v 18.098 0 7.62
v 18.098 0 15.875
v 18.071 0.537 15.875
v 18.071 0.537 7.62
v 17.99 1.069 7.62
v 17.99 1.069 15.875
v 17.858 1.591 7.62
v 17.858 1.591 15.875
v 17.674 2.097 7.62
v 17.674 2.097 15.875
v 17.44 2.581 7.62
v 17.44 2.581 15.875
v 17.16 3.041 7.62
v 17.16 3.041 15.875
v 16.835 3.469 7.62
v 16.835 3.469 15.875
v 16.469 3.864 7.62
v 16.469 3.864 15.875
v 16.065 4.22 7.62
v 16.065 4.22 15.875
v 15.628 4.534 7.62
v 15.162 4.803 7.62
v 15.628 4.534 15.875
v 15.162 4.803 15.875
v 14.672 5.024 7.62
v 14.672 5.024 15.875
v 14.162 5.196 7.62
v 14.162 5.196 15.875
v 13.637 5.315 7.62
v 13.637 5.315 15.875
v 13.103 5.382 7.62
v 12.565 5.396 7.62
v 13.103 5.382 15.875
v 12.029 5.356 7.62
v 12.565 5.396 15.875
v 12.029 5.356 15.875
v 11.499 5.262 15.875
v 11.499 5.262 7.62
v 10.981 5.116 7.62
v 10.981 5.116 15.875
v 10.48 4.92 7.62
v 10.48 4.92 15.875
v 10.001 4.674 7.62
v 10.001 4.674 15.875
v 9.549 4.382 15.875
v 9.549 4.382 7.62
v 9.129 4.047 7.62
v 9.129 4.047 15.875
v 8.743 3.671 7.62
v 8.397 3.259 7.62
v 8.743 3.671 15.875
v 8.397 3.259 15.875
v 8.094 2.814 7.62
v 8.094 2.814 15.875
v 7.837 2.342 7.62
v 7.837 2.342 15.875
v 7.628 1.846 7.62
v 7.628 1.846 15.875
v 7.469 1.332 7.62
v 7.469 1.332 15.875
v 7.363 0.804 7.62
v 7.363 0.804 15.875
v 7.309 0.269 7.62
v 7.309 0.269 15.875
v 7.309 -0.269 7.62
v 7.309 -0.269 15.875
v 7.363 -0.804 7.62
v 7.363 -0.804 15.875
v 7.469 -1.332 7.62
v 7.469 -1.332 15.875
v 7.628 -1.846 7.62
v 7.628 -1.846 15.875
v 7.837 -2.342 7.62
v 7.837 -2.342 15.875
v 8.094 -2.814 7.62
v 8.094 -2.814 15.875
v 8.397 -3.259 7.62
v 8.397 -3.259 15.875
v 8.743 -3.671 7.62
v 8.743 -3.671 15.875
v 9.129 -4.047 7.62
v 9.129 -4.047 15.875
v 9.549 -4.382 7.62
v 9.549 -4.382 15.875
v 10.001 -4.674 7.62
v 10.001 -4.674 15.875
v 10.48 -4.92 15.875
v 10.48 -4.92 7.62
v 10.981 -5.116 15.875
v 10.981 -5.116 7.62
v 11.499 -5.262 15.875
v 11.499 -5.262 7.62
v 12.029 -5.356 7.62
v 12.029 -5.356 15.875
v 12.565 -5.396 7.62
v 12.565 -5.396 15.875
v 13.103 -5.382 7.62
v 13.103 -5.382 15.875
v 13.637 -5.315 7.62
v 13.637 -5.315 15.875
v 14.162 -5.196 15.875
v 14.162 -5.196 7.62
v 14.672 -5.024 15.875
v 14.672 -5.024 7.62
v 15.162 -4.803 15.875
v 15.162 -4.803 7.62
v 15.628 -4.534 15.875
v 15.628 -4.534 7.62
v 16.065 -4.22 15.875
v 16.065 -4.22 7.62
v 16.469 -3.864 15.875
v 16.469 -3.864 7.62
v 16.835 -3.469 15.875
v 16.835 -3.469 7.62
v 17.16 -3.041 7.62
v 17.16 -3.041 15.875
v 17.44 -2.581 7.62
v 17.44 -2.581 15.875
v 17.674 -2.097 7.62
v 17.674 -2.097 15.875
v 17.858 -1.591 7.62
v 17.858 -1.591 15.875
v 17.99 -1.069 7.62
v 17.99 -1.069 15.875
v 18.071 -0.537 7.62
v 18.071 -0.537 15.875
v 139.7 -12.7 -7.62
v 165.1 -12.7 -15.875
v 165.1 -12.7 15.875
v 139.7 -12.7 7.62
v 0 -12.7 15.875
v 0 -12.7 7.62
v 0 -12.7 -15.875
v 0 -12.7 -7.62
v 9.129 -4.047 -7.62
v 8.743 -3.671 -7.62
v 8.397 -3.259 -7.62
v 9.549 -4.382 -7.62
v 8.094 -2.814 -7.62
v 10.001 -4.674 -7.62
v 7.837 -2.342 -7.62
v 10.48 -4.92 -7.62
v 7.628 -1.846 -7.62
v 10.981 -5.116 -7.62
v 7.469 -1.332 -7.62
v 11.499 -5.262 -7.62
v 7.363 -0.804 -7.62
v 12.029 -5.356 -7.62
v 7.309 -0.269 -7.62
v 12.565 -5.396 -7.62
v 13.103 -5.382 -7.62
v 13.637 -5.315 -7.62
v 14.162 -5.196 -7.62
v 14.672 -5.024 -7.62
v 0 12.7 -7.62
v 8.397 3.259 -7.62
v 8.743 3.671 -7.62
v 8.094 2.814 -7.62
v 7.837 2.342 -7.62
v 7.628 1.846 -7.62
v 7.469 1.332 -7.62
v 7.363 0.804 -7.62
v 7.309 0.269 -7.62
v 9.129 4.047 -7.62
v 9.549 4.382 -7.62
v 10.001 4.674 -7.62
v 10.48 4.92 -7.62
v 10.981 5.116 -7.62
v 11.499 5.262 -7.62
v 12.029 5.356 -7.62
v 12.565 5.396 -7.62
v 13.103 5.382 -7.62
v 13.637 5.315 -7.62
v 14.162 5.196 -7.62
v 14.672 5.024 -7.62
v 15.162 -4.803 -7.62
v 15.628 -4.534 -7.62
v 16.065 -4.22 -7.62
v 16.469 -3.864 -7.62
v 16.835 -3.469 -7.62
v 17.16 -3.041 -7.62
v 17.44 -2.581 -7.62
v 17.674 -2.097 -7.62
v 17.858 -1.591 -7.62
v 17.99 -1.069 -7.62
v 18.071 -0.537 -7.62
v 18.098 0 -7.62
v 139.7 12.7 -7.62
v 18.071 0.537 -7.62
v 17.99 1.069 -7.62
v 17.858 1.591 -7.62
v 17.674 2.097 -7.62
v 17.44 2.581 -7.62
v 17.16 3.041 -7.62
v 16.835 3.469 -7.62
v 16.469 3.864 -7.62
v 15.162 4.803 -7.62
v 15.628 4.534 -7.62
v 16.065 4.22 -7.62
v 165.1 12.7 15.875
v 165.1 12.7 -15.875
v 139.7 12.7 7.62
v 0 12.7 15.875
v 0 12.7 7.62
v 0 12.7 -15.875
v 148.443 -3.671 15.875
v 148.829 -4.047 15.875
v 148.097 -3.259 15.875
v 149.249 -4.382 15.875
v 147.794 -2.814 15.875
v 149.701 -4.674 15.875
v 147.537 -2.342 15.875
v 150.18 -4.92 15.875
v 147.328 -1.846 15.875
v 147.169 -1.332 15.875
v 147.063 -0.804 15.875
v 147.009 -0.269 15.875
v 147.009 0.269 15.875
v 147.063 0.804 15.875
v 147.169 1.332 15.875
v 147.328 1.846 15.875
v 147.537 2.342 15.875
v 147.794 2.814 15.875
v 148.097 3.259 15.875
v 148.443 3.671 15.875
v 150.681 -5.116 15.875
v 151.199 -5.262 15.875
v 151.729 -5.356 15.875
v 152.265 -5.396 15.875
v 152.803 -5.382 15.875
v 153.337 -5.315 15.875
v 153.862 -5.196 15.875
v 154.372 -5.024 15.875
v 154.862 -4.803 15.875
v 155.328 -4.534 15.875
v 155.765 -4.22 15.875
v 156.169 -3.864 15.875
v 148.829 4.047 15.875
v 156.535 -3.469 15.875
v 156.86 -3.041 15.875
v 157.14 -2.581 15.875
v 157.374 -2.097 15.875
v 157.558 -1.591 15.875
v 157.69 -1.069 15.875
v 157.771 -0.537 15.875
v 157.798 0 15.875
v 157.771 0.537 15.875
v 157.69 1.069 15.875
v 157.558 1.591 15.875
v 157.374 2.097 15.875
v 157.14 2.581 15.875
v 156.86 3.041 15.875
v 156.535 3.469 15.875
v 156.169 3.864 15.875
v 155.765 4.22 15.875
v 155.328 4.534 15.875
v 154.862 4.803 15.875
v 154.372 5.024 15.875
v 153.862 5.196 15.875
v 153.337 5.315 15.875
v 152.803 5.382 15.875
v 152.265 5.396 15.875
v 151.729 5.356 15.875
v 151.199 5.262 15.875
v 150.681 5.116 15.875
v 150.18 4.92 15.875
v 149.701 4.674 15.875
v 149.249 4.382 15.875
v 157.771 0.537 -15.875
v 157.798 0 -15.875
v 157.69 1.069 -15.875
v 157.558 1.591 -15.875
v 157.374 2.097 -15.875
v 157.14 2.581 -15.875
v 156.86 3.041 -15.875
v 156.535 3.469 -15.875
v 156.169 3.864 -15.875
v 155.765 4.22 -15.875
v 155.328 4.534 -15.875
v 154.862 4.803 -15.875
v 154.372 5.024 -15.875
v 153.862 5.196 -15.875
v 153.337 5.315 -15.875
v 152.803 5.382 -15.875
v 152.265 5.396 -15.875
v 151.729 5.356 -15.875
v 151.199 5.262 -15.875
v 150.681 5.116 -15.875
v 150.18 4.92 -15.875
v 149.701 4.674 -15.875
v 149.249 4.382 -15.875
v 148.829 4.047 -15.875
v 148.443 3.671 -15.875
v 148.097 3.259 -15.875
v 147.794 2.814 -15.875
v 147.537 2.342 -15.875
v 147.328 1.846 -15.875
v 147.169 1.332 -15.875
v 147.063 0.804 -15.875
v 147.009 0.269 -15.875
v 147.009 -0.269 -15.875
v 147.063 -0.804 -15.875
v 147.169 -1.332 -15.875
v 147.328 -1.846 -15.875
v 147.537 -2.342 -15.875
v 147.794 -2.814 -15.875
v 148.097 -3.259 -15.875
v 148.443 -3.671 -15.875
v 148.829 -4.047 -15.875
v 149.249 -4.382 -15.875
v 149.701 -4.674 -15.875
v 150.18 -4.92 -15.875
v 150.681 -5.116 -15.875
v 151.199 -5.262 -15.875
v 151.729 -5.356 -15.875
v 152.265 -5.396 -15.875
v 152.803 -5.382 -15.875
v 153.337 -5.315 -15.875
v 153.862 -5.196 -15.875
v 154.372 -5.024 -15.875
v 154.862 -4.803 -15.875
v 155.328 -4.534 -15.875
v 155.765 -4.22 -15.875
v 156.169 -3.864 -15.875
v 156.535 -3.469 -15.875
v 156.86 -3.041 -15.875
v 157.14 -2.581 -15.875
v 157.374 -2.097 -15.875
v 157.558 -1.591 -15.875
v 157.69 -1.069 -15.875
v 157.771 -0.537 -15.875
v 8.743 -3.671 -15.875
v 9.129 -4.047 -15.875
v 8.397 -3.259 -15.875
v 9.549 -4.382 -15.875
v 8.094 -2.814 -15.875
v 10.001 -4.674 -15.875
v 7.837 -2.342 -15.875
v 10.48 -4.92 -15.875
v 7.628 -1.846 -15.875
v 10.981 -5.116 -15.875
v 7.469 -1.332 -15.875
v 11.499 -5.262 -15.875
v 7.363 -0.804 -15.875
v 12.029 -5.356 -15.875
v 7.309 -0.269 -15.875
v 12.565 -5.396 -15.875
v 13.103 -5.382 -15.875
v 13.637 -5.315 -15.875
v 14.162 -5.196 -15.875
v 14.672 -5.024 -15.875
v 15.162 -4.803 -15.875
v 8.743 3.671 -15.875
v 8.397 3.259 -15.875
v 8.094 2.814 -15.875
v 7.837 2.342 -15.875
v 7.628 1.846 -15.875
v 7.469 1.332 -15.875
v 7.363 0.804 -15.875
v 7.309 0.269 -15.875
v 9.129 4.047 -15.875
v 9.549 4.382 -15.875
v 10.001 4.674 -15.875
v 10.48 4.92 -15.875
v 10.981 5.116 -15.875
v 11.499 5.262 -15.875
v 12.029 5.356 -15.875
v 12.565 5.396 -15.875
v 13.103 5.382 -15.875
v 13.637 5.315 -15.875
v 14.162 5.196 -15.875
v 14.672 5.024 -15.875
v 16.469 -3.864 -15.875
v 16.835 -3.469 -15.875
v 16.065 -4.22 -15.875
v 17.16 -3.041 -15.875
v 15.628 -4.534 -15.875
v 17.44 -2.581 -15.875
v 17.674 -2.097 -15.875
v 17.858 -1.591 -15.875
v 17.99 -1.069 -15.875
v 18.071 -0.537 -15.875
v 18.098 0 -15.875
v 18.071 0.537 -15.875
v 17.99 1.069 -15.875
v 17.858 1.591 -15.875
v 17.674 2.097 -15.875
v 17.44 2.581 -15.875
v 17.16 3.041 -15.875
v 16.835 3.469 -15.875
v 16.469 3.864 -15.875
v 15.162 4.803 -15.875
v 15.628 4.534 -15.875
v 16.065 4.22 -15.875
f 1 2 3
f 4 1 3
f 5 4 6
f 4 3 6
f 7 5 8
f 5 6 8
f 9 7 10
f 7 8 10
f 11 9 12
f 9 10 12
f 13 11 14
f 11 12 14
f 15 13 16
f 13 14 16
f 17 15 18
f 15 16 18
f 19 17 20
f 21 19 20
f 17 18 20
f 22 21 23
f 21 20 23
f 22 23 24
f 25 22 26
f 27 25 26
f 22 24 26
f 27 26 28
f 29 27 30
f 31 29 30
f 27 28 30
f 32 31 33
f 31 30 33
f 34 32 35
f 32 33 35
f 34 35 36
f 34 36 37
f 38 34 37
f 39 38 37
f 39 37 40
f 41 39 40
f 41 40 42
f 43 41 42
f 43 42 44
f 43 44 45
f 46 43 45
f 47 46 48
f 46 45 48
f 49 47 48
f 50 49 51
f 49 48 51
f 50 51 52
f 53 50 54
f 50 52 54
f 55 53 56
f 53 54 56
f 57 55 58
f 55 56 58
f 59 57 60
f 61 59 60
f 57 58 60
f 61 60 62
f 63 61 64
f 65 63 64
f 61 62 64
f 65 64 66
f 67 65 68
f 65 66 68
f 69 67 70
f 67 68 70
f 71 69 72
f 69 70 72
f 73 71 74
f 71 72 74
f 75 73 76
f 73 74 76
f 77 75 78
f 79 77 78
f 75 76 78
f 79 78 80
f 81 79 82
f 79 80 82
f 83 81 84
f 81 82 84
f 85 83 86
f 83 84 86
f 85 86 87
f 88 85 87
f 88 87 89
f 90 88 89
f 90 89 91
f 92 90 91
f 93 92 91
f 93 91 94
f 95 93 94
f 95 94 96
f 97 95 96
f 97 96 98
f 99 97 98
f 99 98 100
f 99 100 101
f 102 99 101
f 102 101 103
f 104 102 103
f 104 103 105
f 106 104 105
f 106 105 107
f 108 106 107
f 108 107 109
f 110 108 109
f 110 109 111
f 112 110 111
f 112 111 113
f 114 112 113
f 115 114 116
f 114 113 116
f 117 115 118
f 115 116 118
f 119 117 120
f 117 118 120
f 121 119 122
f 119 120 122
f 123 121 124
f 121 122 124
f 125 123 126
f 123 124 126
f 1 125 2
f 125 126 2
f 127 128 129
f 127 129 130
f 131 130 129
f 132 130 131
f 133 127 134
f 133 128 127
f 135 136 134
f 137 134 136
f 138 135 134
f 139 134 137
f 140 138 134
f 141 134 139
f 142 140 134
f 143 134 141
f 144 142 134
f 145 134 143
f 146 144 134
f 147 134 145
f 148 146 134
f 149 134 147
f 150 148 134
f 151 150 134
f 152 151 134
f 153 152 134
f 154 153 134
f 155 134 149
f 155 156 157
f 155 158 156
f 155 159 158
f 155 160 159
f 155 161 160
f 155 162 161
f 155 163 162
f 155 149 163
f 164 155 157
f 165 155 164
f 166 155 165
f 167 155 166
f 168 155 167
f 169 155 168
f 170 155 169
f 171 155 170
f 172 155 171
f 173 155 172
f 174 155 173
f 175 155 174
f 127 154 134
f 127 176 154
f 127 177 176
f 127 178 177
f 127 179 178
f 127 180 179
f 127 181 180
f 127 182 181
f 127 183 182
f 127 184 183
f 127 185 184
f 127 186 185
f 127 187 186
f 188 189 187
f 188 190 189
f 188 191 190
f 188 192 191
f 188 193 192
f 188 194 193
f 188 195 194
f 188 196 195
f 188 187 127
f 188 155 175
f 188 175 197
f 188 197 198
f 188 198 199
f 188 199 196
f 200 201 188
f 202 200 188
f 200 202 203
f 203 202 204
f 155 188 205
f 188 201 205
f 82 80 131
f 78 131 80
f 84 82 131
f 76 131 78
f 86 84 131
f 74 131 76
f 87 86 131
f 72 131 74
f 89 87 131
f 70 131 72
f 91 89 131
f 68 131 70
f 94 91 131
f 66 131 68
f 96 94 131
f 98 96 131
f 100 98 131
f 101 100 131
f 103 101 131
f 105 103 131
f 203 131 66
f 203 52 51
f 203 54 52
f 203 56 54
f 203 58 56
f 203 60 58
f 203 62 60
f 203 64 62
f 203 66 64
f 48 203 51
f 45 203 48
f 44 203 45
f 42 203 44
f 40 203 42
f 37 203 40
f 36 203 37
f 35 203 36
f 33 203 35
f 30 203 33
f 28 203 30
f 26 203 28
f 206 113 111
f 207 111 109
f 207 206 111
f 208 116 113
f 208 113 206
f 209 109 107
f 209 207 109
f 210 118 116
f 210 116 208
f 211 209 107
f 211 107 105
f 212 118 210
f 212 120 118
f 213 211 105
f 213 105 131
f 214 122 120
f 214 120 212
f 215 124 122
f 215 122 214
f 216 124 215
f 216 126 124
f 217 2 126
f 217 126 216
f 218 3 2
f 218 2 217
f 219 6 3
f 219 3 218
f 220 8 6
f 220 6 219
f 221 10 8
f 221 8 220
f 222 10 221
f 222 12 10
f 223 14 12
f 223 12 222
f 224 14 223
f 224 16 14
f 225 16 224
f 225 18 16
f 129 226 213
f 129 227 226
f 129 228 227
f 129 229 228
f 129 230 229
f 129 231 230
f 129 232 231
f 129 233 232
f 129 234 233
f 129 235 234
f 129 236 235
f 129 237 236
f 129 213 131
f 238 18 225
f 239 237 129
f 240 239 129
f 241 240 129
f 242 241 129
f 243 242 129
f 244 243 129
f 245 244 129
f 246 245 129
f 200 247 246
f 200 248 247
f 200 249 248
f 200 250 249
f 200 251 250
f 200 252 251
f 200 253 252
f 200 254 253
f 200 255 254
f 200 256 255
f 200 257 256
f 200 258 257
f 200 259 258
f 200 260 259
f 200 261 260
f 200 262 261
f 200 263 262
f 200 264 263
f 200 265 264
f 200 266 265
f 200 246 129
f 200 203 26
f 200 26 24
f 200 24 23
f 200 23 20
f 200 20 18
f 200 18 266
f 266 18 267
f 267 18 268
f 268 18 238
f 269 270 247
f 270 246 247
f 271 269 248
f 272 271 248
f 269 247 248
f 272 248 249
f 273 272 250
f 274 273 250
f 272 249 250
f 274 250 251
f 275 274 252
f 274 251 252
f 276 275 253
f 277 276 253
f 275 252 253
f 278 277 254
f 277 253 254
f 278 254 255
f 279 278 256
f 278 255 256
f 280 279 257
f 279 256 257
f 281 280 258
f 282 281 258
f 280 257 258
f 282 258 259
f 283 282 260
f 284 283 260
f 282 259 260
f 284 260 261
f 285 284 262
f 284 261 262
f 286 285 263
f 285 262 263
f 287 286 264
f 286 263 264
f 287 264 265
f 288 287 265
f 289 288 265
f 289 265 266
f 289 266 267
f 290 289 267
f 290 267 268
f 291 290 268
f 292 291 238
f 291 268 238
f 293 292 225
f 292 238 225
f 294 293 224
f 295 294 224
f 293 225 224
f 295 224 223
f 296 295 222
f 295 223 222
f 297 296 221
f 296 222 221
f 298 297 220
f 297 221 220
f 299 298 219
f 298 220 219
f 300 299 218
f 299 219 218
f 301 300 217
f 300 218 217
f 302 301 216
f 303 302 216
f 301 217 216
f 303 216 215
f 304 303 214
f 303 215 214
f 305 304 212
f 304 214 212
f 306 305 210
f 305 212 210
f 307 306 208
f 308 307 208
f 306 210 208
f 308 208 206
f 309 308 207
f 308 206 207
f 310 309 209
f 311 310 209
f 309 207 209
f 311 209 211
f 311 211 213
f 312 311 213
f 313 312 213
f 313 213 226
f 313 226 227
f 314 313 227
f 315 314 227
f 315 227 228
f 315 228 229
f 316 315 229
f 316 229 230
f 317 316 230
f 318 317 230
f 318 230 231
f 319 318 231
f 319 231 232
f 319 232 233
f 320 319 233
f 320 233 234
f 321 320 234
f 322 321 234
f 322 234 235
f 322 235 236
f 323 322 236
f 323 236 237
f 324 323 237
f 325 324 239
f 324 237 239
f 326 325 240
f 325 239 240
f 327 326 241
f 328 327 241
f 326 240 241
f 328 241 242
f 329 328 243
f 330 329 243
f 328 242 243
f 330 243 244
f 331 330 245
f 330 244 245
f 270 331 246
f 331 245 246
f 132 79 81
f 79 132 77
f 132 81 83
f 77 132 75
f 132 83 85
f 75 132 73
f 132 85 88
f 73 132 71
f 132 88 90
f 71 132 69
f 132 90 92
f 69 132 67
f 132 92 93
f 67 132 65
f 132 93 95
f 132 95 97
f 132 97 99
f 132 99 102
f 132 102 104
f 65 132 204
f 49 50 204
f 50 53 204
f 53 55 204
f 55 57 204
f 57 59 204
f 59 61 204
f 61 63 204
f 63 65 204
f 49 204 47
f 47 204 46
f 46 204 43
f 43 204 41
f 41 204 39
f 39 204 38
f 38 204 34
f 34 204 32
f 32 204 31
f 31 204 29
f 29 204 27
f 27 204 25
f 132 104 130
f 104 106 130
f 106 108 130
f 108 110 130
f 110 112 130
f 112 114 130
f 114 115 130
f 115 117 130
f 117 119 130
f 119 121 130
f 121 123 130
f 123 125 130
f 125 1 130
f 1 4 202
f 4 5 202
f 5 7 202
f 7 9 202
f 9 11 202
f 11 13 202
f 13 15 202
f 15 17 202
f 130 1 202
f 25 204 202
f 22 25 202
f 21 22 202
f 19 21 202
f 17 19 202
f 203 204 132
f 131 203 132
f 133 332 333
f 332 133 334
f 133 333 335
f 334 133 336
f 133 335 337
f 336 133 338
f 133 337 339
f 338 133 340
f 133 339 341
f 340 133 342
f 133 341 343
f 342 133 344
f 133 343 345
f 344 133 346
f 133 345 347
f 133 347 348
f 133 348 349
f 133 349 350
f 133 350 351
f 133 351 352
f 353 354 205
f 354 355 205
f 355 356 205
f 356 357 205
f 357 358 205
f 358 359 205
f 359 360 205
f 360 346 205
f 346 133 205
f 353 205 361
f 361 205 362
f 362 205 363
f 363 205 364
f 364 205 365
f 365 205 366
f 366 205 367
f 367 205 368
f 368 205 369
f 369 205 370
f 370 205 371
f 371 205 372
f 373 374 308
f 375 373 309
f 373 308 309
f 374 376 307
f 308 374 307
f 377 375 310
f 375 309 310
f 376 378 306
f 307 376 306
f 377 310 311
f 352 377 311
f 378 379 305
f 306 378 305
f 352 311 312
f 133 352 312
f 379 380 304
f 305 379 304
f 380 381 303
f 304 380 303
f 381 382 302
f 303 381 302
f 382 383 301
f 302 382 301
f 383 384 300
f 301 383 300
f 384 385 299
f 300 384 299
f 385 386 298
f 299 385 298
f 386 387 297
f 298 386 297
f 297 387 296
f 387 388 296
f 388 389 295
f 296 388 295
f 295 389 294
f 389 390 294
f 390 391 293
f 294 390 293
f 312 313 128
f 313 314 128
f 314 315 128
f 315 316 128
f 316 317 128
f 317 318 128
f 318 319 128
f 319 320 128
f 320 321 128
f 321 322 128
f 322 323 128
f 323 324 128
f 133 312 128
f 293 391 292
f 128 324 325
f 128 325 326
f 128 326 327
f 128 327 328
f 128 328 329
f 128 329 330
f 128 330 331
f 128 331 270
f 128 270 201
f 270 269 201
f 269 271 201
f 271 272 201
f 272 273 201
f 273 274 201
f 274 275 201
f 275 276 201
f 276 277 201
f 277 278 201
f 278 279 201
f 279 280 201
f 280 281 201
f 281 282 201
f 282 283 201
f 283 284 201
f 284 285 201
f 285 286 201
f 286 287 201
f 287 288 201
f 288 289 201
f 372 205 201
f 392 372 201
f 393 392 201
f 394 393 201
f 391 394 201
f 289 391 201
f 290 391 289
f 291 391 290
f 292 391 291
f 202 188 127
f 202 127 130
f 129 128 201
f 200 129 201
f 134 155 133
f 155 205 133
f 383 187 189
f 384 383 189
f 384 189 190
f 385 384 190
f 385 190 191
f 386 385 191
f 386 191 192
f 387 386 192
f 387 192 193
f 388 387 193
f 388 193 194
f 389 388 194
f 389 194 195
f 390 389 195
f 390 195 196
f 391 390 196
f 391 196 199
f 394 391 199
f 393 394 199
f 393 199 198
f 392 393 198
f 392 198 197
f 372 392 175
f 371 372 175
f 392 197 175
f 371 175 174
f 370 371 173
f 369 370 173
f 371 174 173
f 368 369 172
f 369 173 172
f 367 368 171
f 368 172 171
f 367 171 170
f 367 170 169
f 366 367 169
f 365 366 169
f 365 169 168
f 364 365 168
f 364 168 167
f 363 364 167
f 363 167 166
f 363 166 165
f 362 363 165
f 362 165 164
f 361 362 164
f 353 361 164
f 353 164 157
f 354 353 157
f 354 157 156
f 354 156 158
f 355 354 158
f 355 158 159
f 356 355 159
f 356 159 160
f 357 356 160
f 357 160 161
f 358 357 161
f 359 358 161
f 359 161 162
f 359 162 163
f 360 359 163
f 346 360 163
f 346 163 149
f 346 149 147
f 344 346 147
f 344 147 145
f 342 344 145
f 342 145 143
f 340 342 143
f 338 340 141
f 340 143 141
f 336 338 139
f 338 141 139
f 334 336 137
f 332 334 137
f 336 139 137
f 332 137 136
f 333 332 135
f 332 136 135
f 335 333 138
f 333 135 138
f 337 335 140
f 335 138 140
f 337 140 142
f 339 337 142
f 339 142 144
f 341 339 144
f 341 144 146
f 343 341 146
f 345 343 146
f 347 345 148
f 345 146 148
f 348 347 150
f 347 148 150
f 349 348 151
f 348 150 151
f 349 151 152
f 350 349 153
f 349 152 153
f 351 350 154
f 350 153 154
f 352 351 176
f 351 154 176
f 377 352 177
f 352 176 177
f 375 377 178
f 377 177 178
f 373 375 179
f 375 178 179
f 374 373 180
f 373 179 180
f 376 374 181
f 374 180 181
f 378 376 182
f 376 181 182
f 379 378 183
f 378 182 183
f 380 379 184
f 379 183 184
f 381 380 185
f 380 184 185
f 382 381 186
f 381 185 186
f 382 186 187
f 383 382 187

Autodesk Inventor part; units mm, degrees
ref_plane "YZ Plane" through (0, 0, 0) normal (1, 0, 0) x (0, 1, 0)
ref_plane "XZ Plane" through (0, 0, 0) normal (0, 1, 0) x (-1, 0, 0)
ref_plane "XY Plane" through (0, 0, 0) normal (0, 0, 1) x (1, 0, 0)
sketch "Sketch1" plane through (0, 0, 0) normal (0, 0, 1) x (1, 0, 0)
  line L0 (0, 0) -> (165.1, 0)
  line L1 (165.1, 0) -> (165.1, 12.7)
  line L2 (165.1, 12.7) -> (0, 12.7)
  line L3 (0, 12.7) -> (0, 0)
  line L4 (165.1, 0) -> (165.1, -12.7)
  line L5 (165.1, -12.7) -> (0, -12.7)
  line L6 (0, -12.7) -> (0, 0)
  dimension "d2" = 165.1
  dimension "d3" = 25.4
extrude "Extrusion1" add sketch "Sketch1" along normal mid plane 31.75
sketch "Sketch3" plane through (0, 12.7, 15.875) normal (0, 1, 0) x (1, 0, 0)
  line L0 (0, 15.875) -> (165.1, 15.875) construction
  line L1 (165.1, 31.75) -> (165.1, 0) construction
  line L2 (0, 31.75) -> (0, 0) projected
  line L3 (0, 23.495) -> (139.7, 23.495)
  line L4 (139.7, 23.495) -> (139.7, 15.875)
  line L5 (0, 23.495) -> (0, 15.875)
  line L6 (0, 0) -> (0, 31.75)
  line L7 (0, 8.255) -> (139.7, 8.255)
  line L8 (139.7, 8.255) -> (139.7, 15.875)
  dimension "d6" = 139.7
  dimension "d7" = 7.62
extrude "Extrusion2" cut sketch "Sketch3" against normal through all
sketch "Sketch4" plane through (0, 0, 15.875) normal (0, 0, 1) x (1, 0, 0)
  circle A0 centre (12.7, 0) radius 5.3975
  circle A1 centre (152.4, 0) radius 5.3975
  line L0 (165.1, -12.7) -> (165.1, 12.7) projected
  point P0 (0, 0)
  dimension "d10" = 10.795
  dimension "d11" = 12.7
  dimension "d12" = 12.7
extrude "Extrusion3" cut sketch "Sketch4" against normal through all
properties part number "connectiingRodV03"
